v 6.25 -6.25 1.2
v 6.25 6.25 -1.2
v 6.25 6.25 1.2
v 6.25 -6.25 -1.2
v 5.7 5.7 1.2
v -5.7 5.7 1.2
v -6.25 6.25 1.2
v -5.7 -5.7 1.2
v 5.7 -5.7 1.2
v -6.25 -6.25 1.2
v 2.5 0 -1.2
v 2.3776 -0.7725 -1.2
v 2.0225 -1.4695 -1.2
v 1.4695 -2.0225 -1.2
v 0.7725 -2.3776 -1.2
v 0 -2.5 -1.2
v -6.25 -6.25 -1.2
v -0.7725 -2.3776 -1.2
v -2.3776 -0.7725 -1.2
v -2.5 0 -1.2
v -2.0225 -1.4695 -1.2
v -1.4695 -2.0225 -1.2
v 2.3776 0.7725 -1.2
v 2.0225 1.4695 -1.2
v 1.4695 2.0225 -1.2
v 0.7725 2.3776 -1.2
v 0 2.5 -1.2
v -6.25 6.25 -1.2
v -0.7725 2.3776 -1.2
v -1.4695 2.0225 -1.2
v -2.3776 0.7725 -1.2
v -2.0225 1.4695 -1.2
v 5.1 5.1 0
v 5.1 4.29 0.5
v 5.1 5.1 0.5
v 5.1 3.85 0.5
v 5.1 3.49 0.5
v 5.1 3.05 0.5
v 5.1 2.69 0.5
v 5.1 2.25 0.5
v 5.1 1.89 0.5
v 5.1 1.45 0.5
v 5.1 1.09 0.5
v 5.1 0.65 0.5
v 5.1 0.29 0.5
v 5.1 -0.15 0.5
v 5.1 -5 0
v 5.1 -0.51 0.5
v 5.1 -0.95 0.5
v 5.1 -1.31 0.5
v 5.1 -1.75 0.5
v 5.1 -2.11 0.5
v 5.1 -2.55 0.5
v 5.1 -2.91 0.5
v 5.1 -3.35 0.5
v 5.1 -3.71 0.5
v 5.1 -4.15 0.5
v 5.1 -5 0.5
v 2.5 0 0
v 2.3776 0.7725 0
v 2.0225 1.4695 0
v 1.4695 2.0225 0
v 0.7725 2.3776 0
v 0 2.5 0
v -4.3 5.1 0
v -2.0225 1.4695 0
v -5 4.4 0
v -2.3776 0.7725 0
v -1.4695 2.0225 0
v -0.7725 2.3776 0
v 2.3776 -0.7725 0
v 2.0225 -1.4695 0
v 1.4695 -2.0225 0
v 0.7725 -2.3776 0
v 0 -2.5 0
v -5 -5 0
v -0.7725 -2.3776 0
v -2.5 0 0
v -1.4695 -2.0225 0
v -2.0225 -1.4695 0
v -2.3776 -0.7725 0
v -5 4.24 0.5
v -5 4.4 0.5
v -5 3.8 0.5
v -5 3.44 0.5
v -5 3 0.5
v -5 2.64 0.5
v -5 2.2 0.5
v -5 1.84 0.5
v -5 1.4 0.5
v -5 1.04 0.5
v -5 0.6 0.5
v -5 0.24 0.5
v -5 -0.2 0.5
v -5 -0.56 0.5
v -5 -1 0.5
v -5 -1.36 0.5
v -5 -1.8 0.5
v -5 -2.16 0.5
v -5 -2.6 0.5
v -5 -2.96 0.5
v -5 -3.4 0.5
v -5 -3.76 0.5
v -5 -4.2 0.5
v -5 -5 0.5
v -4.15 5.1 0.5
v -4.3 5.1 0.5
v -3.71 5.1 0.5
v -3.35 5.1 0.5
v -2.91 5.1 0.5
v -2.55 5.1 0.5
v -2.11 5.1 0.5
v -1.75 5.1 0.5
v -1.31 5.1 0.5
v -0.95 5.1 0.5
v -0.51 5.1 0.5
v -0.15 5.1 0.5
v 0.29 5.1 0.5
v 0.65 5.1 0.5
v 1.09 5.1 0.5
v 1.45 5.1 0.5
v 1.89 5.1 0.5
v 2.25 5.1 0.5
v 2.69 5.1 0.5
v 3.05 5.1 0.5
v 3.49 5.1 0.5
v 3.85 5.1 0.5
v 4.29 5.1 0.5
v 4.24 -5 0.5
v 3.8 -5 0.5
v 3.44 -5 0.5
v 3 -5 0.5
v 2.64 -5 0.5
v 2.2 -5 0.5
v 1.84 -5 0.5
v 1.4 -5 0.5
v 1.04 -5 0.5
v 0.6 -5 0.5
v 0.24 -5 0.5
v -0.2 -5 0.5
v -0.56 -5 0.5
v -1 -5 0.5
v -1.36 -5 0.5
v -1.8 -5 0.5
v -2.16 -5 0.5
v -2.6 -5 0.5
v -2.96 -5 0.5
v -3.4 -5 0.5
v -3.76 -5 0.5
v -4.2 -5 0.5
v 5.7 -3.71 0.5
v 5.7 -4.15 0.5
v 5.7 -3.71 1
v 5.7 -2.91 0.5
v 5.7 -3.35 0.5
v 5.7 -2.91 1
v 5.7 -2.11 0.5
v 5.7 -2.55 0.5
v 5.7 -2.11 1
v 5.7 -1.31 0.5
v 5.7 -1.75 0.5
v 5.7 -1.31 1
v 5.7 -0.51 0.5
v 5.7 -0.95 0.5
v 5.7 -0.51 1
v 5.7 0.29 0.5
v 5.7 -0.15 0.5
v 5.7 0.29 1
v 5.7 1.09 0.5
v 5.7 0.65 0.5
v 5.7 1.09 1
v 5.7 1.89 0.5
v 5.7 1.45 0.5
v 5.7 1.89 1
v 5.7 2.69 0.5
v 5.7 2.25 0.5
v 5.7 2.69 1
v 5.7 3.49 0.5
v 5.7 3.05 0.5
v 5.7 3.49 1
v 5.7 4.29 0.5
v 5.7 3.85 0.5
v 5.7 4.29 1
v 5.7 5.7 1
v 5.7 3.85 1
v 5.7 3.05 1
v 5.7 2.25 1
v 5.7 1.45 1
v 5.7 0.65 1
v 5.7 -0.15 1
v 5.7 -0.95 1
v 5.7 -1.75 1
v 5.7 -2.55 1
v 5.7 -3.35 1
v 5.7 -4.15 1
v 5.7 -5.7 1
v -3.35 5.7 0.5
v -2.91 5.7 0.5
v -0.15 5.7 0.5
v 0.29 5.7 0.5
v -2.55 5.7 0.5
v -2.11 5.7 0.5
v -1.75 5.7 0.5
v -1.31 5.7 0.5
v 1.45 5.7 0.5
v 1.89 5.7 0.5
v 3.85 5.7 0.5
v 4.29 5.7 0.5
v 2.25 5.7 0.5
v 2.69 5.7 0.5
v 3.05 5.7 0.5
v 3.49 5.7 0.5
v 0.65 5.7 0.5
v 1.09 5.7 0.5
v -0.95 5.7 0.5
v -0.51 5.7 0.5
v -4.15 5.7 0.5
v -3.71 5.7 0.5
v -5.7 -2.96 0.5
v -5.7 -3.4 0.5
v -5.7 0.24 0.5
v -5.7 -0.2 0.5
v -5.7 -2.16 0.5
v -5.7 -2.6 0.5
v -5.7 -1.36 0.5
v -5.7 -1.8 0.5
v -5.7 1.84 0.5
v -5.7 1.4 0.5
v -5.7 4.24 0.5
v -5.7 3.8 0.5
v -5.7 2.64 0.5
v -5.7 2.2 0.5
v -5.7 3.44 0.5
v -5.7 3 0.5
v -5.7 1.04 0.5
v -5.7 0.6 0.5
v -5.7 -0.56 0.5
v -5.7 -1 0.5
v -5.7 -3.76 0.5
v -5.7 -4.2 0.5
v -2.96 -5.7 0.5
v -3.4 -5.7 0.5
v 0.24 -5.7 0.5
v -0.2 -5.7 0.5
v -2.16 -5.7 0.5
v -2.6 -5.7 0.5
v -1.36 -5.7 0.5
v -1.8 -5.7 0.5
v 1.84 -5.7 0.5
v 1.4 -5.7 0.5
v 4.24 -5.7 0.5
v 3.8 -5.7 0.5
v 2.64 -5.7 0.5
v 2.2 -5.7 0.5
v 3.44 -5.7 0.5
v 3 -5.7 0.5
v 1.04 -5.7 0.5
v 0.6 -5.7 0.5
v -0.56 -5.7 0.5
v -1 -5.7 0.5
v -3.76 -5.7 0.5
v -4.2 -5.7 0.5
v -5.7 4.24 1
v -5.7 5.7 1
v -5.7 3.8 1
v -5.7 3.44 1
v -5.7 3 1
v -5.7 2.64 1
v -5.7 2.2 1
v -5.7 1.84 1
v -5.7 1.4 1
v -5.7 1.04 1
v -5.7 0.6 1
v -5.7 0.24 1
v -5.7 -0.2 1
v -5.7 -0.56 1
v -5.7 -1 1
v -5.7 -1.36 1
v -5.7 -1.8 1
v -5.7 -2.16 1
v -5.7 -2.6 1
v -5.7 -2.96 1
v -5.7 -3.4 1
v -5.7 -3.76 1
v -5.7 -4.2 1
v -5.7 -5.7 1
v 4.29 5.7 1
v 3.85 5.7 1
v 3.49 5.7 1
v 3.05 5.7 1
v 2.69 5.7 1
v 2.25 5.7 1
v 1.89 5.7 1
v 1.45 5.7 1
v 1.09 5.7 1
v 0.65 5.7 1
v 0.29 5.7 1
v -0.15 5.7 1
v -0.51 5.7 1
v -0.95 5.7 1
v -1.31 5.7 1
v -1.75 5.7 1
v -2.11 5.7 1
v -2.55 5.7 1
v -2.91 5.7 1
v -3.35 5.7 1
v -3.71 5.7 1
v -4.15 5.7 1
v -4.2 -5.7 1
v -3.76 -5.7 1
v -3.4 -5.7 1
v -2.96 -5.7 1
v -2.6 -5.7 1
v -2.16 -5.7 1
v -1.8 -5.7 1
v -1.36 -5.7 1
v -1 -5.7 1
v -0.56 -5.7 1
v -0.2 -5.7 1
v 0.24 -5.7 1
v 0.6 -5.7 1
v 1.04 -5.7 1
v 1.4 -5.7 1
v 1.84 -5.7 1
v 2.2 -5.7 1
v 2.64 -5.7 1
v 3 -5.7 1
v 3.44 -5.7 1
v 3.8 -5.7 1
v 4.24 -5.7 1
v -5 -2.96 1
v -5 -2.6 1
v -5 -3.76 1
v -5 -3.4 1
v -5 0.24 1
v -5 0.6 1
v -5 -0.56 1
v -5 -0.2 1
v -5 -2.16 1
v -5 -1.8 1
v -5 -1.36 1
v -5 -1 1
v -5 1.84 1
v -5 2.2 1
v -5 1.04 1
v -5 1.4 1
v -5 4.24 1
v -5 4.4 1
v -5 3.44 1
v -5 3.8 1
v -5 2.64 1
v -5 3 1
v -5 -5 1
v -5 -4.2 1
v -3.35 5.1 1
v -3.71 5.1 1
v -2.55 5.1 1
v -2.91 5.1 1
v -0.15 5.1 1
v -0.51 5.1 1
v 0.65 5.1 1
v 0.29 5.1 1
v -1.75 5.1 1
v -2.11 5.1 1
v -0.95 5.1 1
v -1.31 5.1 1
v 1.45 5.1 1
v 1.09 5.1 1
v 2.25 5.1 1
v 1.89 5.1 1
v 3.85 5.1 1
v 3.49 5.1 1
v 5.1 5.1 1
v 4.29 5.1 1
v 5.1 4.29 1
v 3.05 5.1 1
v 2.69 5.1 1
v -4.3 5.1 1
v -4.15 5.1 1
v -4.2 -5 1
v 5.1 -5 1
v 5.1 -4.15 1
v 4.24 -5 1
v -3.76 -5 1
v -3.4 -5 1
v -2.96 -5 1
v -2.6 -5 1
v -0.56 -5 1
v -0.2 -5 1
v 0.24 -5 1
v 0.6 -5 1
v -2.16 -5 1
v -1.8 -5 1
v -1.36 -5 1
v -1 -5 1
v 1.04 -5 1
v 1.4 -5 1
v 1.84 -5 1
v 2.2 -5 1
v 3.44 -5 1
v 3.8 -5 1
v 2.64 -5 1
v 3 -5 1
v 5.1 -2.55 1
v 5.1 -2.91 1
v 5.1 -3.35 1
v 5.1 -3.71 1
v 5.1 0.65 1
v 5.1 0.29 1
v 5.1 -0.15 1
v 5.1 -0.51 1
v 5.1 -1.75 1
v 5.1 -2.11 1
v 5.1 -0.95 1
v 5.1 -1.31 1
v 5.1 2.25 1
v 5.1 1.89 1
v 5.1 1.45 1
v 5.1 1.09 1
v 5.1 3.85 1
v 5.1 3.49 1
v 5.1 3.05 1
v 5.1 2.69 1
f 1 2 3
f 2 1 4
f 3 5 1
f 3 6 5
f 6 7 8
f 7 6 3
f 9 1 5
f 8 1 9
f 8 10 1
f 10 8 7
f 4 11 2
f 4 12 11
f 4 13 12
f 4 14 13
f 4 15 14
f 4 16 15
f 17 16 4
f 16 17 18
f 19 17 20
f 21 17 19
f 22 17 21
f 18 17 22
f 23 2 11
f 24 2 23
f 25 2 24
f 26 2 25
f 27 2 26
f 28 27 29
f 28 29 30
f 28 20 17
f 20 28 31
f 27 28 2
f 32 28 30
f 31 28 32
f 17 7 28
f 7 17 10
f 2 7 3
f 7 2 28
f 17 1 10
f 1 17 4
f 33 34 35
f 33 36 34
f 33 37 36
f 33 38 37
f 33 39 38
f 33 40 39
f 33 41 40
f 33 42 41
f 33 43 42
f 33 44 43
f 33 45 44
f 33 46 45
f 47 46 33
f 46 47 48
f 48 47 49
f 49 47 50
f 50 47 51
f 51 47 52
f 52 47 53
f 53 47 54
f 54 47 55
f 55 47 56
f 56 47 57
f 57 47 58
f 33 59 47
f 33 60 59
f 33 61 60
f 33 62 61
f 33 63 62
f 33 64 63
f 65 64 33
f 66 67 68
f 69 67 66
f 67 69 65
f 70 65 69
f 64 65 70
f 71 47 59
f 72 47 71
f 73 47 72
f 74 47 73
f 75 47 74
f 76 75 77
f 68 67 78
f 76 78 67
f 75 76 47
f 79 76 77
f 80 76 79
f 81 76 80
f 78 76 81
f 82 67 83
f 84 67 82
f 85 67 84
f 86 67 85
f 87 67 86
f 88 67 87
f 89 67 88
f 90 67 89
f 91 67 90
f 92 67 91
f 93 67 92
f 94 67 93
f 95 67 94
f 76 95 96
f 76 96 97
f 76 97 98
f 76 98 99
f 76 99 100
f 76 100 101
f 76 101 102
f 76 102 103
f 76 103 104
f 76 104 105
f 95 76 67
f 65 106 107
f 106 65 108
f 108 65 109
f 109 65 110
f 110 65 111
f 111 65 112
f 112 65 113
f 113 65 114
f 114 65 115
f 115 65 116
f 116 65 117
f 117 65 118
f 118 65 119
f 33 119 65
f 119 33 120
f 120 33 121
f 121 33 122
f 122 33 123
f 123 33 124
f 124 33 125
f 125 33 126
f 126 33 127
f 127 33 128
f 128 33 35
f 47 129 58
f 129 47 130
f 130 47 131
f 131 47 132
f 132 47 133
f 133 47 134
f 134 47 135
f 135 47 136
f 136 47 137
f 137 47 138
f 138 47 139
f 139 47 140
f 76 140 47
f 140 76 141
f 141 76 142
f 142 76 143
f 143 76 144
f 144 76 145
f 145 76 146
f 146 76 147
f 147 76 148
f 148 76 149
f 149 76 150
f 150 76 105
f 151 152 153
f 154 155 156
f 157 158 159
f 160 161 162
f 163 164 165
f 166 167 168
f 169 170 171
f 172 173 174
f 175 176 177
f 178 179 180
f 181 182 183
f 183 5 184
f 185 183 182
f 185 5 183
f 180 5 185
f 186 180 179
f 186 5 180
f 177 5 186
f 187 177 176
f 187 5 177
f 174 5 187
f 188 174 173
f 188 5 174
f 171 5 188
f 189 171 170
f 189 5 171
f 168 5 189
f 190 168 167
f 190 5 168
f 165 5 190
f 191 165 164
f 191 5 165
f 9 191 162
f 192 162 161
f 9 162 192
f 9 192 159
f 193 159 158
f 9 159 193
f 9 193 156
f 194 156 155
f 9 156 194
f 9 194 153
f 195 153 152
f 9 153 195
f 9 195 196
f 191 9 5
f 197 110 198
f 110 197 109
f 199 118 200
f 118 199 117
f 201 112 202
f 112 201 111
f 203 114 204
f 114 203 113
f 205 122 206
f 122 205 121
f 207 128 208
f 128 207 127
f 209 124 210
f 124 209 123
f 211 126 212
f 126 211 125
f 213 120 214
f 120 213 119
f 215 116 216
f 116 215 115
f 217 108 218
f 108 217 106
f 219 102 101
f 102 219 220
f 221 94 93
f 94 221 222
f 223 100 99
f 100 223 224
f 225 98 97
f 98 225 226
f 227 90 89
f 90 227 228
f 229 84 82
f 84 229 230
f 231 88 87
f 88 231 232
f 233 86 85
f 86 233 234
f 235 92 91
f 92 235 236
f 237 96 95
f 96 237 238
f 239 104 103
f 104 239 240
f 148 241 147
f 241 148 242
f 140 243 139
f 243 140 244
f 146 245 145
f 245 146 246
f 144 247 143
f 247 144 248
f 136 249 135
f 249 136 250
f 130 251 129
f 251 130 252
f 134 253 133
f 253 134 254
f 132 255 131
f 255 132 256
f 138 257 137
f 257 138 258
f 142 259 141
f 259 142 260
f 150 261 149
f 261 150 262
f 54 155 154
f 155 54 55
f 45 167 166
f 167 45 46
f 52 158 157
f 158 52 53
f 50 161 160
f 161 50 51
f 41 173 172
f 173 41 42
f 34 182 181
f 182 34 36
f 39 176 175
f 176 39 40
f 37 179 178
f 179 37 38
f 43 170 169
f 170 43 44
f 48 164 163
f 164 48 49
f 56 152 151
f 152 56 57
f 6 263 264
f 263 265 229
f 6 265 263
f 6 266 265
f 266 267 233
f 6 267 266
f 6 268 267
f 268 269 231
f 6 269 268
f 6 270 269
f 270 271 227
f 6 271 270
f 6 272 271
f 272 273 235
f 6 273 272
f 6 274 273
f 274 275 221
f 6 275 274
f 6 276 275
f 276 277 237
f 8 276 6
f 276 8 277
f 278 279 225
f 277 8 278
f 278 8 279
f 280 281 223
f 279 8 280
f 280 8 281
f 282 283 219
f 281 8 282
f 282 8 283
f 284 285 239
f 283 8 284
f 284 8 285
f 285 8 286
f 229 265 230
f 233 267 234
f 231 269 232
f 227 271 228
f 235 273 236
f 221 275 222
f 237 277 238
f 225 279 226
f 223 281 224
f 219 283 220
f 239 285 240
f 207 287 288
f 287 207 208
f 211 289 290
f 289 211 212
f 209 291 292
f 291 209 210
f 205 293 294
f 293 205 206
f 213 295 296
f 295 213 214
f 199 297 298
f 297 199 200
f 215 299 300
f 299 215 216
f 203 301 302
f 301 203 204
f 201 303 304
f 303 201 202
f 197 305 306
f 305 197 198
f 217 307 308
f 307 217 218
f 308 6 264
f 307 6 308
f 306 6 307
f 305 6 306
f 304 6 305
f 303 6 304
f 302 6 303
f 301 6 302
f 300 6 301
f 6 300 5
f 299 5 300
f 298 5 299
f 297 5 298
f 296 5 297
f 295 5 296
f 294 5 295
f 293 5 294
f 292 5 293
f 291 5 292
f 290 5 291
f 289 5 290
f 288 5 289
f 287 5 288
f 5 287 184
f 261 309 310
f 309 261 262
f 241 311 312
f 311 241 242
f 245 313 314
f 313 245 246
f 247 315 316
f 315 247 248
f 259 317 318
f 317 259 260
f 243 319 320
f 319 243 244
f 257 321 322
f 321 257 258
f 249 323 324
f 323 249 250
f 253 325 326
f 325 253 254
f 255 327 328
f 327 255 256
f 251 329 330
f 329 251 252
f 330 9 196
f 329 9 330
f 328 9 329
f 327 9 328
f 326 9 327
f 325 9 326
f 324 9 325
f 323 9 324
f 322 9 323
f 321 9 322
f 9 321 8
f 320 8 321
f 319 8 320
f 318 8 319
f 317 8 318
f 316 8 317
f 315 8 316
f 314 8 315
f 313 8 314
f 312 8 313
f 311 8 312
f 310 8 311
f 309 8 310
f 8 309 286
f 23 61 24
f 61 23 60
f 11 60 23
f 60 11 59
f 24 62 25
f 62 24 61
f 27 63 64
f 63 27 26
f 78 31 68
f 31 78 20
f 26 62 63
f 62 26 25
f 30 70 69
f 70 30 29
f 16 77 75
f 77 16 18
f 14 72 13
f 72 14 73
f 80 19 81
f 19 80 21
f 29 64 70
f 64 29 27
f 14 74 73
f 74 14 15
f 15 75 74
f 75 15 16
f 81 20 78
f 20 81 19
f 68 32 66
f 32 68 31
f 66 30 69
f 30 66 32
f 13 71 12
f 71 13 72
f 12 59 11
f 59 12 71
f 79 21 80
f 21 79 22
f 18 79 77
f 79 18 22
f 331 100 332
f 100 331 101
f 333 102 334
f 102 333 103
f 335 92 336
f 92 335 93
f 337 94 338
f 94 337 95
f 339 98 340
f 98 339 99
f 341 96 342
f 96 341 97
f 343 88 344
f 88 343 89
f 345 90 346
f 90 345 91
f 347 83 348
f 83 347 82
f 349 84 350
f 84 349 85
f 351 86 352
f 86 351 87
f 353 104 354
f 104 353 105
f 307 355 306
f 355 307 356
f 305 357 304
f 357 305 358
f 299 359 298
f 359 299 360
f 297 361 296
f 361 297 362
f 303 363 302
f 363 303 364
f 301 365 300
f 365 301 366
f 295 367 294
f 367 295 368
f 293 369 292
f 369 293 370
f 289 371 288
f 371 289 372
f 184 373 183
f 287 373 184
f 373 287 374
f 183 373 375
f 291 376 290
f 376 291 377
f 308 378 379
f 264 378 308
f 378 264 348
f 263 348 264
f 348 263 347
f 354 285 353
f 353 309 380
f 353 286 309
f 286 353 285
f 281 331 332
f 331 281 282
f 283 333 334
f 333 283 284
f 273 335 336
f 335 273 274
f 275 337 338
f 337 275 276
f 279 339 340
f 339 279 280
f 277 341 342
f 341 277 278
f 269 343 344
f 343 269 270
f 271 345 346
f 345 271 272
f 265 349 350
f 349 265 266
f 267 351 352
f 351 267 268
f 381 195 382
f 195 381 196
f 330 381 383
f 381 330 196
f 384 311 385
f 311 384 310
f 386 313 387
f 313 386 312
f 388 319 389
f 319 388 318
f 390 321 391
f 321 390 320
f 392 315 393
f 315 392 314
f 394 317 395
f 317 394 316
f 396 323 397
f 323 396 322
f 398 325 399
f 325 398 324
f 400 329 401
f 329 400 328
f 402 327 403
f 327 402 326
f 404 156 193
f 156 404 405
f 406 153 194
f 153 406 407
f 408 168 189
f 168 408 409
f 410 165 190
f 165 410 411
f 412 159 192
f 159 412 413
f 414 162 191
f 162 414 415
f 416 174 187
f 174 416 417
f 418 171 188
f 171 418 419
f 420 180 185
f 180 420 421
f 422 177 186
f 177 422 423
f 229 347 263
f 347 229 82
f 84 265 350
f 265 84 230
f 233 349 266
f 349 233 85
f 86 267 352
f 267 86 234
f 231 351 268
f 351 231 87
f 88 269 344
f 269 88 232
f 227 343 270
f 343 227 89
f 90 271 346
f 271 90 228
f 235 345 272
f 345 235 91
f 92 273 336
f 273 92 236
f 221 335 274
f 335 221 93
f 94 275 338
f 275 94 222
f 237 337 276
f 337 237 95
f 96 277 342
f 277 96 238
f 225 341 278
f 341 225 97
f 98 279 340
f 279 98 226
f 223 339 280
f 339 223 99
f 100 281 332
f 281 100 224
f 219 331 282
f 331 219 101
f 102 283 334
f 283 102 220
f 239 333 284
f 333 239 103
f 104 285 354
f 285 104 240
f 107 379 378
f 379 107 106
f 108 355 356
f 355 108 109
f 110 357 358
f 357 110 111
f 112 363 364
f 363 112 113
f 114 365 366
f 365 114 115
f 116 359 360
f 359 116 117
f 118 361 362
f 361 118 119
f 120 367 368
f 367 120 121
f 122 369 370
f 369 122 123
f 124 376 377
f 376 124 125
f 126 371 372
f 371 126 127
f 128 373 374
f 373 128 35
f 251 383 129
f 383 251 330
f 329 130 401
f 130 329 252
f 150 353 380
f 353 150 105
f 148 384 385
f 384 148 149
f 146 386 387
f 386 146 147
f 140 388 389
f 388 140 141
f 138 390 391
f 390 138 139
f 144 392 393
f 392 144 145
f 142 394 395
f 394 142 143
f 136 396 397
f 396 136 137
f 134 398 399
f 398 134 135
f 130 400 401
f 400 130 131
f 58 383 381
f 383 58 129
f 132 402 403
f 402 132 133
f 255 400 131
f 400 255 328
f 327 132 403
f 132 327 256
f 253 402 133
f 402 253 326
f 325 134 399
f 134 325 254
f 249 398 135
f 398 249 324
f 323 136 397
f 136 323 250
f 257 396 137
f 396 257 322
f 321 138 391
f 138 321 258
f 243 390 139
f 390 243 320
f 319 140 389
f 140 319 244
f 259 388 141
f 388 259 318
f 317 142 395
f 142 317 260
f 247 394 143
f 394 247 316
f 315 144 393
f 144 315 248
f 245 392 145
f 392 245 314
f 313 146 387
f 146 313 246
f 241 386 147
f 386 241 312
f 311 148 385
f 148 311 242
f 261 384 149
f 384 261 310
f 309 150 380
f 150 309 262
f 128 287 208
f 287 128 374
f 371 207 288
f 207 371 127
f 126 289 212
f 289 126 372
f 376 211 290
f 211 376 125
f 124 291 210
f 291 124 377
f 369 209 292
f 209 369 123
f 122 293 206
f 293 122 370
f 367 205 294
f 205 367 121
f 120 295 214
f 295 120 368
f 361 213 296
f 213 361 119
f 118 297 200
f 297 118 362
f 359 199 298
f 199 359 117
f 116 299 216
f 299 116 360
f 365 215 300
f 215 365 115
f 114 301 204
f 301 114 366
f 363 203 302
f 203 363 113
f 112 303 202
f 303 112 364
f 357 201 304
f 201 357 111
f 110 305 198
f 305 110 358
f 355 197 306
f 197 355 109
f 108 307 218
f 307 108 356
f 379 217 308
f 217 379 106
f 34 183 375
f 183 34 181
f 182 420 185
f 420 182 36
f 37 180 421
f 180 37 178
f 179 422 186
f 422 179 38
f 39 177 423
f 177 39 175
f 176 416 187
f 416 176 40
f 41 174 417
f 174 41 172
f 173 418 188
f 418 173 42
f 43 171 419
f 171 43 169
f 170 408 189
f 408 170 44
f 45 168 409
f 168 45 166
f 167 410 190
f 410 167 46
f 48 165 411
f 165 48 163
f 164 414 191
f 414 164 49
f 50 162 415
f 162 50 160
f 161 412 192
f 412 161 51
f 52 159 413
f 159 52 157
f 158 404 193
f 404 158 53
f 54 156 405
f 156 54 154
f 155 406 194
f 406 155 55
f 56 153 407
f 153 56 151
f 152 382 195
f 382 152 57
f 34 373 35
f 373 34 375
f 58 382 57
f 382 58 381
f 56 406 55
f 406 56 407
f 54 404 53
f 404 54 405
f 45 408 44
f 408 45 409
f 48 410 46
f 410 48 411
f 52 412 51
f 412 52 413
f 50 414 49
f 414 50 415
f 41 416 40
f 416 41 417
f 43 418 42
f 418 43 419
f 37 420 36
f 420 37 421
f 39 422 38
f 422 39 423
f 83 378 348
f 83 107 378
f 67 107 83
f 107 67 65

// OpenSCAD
difference()
{
	cube([12.5,12.5,2.4], center = true);
	translate([ -5, -5, 0 ]) cube(size=[10.1,10.1,1.2]);
	translate([-5.7,-5.7,0.5]) cube(size=[11.4,11.4,0.7]);
	cylinder (h = 4, r1 = 2.5, r2 = 2.5, center = true, $fn = 20);
};
translate([-5,4.4,0]) rotate ([0,0,45]) cube([1,1,1]);
difference()
{
	translate ([-5.7,-5.7,0.5]) cube ([0.7,10.8,0.5]);
	for(i=[1:11])
		{
		translate ([-5.7,4.6-(i*0.8),0.5]) cube ([0.7,0.44,0.5]);
		}
};
difference()
{
	translate ([-5,-5.7,0.5]) cube ([10.7,0.7,0.5]);
	for(i=[1:11])
		{
		translate ([4.6-(i*0.8),-5.7,0.5]) cube ([0.44,0.7,0.5]);
		}
};
difference()
{
	translate ([-5.7,5.1,0.5]) cube ([10.9,0.7,0.5]);
	for(i=[1:11])
		{
		translate ([4.65-(i*0.8),5,0.5]) cube ([0.44,0.7,0.5]);
		}
};
difference()
{
	translate ([5.1,-5,0.5]) cube ([0.7,10.9,0.5]);
	for(i=[1:11])
		{
		translate ([5,4.65-(i*0.8),0.5]) cube ([0.7,0.44,0.5]);
		}
};
